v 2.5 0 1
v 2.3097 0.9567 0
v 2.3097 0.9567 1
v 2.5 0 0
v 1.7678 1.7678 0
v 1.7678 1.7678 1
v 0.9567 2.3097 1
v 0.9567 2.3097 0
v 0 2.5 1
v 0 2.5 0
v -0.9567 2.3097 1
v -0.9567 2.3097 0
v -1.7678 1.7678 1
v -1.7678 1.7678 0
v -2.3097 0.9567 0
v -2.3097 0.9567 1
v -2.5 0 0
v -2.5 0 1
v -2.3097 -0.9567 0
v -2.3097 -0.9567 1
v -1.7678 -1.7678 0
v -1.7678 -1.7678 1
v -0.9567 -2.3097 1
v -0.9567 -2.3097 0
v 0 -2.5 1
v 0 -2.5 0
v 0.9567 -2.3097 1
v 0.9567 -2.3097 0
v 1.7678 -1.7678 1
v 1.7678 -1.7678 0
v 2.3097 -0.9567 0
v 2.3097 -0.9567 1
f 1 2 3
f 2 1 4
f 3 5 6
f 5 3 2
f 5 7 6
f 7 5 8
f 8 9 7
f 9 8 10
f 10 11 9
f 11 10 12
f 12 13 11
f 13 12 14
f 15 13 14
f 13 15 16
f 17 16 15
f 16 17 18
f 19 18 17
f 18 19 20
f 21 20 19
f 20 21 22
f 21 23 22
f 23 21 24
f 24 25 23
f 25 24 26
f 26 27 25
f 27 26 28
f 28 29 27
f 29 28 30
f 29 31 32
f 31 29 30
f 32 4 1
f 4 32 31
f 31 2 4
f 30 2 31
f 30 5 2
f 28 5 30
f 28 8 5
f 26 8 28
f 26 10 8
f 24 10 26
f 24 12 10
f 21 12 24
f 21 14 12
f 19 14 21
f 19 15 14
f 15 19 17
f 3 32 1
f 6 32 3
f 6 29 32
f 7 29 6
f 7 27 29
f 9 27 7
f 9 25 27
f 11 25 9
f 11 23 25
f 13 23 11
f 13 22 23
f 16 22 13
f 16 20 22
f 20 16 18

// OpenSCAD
$fn = 16;
wallThickness = 2;

base(wallThickness);

module base(thickness) {
    difference() {
        union() {
            difference() {
                union() {
                    translate([0,0,5+thickness/2])
                    cube([50+thickness*2,60+thickness*2,10+thickness], center = true);
                    translate([-35,5,5+thickness/2])
                    cube([20+thickness*2,50+thickness*2,10+thickness], center = true);
                }
                translate([0,0,5+thickness/2+thickness])
                cube([50,60,10+thickness], center = true);
                translate([-35+0.01-thickness/2,5,5+thickness/2+thickness])
                cube([20+thickness,50,10+thickness], center = true);
            }
            difference() {
                translate([-35-thickness,5,15])
                cube([20+thickness*2,50+thickness*2,30], center = true);
                
                translate([-34.99+thickness/2-thickness,5,15])
                cube([20+thickness,50,31], center = true);
                
                translate([-35+0.01-thickness/2,25+thickness*2,28-8])
                cube([9,thickness*10,3.5], center = true);
            }
        }
        
        translate([0,0,-5]) {
            //RFID PINS
            translate([20-1.3-1.2,30-1.3-14,0])
            cylinder(r = 1.3, h = 20);
            mirror([1,0,0])
            translate([20-1.3-1.2,30-1.3-14,0])
            cylinder(r = 1.3, h = 20);

            translate([20-1.3-6,-30+1.3+6,0])
            cylinder(r = 1.3, h = 20);
            mirror([1,0,0])
            translate([20-1.3-6,-30+1.3+6,0])
            cylinder(r = 1.3, h = 20);
        }
    }

    difference() {
        translate([0,0,0.1]) {
            difference() {
                translate([0,0,10+thickness/2+thickness])
                cube([50+thickness*2,60+thickness*2,thickness], center = true);
                translate([-26-0.01,5,11.01+thickness/2])
                cube([thickness+0.01,50.02+thickness*2,thickness*2], center = true);
            }
            translate([-35-thickness,5,30+thickness/2])
            cube([20+thickness*2,50+thickness*2,thickness], center = true);
            
            translate([-26+0.01+thickness,5,21+thickness/2])
            cube([thickness,50+thickness*2,18+thickness], center = true);
            
            translate([-46,5,28.5])
            cube([thickness,15,4], center = true);
            
            !union() {
                cylinder(r=2.5, h = 1);
            }
        }
        translate([0,0,-5]) {
            //RFID PINS
            translate([20-1.3-1.2,30-1.3-14,0])
            cylinder(r = 1.3, h = 20);
            mirror([1,0,0])
            translate([20-1.3-1.2,30-1.3-14,0])
            cylinder(r = 1.3, h = 20);

            translate([20-1.3-6,-30+1.3+6,0])
            cylinder(r = 1.3, h = 20);
            mirror([1,0,0])
            translate([20-1.3-6,-30+1.3+6,0])
            cylinder(r = 1.3, h = 20);
        }
    }
}
